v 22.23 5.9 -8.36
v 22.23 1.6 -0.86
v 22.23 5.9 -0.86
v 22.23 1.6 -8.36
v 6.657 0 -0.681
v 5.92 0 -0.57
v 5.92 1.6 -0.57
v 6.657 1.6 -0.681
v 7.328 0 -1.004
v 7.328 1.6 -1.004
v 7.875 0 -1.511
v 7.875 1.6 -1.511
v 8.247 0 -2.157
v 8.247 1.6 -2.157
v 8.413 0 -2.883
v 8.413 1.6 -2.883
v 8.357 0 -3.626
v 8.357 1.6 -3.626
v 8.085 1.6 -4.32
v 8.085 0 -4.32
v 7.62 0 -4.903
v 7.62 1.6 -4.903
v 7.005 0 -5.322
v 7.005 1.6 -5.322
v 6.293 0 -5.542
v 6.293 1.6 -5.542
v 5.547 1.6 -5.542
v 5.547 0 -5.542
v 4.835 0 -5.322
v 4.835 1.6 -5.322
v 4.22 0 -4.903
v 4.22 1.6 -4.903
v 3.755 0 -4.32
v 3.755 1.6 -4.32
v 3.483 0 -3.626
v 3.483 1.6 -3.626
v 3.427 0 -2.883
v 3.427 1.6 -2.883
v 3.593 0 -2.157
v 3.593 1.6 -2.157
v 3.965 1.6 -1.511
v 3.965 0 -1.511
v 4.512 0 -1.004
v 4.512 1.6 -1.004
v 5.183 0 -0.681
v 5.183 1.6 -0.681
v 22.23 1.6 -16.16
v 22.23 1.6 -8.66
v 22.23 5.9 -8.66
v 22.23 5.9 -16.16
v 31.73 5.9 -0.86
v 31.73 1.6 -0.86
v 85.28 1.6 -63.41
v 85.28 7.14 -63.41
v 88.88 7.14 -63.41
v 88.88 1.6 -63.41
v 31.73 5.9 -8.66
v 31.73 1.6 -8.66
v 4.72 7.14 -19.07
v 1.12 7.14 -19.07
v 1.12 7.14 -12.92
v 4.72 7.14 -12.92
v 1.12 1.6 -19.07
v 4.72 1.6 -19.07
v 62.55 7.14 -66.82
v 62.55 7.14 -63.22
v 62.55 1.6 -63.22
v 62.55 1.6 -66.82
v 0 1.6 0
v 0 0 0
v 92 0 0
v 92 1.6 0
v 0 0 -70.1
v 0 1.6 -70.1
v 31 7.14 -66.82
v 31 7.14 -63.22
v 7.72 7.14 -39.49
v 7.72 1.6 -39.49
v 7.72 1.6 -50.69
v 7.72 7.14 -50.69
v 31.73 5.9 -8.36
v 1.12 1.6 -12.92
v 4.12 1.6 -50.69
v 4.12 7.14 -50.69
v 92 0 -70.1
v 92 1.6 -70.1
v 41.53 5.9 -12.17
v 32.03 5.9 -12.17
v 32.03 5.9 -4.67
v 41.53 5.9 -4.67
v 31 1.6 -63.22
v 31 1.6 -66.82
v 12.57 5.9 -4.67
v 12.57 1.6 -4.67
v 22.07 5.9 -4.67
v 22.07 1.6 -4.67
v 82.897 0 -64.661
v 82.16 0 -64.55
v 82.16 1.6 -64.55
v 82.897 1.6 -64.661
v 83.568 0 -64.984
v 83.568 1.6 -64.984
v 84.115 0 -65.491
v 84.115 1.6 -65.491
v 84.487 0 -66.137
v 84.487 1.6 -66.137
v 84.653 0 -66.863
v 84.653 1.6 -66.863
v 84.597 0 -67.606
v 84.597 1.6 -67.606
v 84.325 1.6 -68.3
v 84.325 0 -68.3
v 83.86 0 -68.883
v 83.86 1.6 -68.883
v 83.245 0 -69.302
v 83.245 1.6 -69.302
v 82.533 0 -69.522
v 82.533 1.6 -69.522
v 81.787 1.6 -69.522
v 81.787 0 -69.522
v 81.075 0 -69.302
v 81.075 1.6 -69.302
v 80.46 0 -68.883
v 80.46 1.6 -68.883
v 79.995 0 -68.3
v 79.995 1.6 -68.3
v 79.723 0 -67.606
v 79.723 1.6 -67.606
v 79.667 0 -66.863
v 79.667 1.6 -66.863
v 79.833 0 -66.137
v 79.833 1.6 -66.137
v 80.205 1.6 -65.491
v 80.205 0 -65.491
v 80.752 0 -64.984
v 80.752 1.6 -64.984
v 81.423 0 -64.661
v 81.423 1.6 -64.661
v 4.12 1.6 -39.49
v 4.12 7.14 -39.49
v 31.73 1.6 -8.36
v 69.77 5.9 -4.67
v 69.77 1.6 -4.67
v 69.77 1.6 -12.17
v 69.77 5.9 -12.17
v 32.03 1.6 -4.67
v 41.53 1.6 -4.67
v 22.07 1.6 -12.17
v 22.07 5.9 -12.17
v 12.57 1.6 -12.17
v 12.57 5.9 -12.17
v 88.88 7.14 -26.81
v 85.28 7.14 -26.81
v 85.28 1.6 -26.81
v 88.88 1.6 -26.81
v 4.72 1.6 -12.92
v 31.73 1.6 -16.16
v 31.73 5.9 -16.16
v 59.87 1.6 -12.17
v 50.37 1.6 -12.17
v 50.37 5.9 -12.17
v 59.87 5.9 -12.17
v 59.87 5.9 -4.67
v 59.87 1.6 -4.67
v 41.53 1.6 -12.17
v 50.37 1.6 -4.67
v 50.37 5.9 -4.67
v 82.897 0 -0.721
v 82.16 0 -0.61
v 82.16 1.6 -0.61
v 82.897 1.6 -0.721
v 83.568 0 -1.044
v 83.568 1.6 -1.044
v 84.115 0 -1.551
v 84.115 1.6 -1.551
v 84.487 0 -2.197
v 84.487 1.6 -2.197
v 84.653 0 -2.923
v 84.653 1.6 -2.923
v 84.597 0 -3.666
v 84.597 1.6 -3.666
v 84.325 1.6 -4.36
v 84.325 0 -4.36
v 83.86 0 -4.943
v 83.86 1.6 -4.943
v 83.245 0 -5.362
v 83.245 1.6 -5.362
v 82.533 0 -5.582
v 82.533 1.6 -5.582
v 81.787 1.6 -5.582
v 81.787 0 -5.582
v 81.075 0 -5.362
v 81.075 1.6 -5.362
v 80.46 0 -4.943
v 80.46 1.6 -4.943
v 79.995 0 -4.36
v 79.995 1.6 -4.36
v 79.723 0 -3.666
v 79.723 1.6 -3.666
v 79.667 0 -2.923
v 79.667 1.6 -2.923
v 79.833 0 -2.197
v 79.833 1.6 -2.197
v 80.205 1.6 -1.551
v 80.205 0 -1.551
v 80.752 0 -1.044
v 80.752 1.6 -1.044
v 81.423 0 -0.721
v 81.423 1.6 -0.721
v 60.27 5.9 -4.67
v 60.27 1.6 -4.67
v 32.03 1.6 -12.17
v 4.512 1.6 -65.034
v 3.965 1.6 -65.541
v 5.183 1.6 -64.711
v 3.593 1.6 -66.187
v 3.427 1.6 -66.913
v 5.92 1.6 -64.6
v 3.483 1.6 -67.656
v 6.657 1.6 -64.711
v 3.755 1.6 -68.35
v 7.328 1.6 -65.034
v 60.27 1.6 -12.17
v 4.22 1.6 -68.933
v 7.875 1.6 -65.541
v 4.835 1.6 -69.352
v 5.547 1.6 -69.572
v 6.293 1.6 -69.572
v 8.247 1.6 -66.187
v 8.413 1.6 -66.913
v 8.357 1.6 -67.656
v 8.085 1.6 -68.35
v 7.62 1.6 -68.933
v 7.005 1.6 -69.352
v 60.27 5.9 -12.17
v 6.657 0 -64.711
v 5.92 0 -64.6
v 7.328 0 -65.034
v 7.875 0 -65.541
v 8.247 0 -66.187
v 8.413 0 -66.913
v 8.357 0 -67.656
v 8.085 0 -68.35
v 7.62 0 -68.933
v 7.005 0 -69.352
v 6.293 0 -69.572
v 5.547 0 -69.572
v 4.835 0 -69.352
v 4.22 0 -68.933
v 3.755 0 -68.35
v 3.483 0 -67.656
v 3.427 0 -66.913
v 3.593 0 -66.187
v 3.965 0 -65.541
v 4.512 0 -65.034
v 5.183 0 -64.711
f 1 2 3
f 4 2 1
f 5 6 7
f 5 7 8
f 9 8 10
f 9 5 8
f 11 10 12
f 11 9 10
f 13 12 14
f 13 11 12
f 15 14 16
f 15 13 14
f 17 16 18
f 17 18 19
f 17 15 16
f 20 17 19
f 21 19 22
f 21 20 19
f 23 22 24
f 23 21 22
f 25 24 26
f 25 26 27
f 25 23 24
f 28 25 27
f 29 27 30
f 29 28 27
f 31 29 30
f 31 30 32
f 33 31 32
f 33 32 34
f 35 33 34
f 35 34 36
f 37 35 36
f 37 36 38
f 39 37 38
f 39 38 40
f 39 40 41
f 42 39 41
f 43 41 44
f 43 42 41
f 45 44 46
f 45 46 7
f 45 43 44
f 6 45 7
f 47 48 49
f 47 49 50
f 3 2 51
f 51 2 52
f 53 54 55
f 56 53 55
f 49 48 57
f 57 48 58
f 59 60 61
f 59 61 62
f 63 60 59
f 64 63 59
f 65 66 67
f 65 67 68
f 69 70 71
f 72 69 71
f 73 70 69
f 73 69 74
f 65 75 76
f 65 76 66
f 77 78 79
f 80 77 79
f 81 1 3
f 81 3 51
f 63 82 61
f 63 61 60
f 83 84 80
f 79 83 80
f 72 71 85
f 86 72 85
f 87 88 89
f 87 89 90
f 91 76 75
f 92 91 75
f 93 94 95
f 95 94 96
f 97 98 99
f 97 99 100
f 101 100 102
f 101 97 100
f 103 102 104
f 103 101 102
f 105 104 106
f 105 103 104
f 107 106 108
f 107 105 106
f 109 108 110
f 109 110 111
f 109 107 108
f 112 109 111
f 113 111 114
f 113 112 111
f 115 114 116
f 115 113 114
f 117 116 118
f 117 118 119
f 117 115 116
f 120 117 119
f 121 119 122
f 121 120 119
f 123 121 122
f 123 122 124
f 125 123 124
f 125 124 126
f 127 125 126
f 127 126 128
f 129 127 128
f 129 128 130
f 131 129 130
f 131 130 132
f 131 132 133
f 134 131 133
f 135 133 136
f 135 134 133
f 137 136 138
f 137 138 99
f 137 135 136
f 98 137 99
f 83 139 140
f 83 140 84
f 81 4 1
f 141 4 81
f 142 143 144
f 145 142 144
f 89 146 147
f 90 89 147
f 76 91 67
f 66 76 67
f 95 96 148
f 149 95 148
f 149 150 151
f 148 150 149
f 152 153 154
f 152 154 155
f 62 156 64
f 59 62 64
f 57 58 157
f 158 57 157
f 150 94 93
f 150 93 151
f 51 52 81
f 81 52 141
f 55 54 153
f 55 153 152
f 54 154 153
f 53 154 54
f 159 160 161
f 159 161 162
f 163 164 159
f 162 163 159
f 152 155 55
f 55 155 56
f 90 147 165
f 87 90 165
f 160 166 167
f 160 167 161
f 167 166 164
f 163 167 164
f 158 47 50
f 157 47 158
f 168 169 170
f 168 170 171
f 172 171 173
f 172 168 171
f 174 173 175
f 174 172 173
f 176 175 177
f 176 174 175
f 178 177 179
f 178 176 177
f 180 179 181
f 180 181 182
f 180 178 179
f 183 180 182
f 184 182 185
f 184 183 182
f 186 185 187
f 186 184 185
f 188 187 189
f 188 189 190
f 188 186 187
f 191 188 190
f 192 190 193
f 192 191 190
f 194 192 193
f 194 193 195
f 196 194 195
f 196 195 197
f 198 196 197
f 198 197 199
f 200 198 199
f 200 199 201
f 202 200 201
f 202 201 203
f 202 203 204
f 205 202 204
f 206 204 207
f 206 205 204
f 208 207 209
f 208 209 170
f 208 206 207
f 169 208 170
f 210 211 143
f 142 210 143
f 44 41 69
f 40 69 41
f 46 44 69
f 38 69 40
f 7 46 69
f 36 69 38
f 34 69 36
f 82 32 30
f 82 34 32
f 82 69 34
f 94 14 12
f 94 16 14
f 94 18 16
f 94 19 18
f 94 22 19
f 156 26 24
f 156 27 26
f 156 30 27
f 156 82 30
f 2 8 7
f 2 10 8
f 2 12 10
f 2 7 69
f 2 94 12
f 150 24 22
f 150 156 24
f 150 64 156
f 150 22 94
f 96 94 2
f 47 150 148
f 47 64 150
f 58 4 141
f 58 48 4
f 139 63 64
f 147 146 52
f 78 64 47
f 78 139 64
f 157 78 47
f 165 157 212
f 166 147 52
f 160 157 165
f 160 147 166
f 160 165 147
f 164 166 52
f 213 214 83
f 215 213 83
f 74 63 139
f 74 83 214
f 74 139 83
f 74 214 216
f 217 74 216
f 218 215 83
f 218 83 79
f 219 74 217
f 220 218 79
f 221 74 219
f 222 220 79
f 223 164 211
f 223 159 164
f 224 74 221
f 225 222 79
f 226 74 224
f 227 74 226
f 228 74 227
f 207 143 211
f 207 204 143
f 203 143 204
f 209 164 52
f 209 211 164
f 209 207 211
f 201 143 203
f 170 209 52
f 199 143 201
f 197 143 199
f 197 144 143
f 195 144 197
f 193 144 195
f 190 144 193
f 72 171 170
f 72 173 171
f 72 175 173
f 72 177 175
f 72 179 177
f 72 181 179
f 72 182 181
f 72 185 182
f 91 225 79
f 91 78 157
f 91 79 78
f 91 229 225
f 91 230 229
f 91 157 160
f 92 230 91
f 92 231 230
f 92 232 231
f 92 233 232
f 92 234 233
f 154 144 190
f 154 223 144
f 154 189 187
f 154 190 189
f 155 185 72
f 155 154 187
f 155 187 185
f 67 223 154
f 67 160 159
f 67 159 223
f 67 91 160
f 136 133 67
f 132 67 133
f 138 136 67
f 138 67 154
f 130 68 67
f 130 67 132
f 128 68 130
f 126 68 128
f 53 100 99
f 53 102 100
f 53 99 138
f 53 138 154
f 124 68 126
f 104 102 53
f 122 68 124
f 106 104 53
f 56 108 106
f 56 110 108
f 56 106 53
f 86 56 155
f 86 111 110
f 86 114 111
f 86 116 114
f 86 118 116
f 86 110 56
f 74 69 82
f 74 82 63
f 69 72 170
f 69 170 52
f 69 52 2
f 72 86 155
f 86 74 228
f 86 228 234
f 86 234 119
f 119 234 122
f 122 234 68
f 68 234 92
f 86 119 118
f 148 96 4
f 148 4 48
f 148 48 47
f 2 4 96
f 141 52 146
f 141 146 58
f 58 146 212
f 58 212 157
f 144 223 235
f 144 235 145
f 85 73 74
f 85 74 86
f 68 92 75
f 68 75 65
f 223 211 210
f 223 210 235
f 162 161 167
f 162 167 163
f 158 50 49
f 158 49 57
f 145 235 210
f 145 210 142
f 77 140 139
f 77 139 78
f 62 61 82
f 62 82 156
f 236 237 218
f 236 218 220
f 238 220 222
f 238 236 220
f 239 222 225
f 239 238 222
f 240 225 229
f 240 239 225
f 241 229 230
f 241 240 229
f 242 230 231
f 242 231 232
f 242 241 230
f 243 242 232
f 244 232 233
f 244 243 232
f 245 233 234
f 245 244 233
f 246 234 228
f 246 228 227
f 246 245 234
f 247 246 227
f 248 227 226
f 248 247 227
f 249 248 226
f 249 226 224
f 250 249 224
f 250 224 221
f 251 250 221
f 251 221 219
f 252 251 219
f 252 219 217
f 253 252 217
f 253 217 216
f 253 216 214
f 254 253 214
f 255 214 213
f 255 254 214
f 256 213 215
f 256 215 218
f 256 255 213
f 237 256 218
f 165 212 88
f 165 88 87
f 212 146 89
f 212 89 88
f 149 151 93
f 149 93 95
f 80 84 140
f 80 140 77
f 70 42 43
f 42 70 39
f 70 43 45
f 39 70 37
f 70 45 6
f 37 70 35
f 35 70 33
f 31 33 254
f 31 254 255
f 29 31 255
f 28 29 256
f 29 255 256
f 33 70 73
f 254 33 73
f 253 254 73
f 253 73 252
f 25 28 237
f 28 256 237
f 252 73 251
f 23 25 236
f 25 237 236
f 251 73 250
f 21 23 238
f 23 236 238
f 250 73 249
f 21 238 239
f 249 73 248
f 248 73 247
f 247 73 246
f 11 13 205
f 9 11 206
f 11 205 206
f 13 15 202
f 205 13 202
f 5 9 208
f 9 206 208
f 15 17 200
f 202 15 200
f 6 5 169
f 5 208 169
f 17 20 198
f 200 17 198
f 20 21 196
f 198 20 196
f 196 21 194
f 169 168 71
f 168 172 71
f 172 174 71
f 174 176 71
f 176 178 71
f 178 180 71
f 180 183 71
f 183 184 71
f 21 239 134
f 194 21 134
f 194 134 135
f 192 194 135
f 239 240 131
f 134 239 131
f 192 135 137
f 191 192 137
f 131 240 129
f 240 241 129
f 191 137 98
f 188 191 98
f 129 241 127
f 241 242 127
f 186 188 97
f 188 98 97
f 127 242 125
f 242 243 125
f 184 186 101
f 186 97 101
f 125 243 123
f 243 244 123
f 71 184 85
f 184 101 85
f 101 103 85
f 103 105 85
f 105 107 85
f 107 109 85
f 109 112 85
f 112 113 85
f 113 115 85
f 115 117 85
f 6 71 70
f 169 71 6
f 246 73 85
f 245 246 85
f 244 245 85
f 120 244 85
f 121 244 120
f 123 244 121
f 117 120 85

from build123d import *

# Parameters (mm, degrees)
SKETCH1_W             = 92
SKETCH1_H             = 70.1
SKETCH1_R             = 2.5
Y_PCB_EXTR_DEPTH      = 1.6
SKETCH2_W             = 31.55
SKETCH2_H             = 3.6
SKETCH2_W_2           = 3.6
SKETCH2_H_2           = 11.2
SKETCH2_H_3           = 6.15
SKETCH2_H_4           = 36.6
Y_HEADERS_EXTR_DEPTH  = 5.54
SKETCH3_W             = 9.5
SKETCH3_H             = 7.5
Y_SWITCHES_EXTR_DEPTH = 4.3


with BuildPart() as part:
    # Sketch1 → Y+ PCB extr (new body)
    with BuildSketch(Plane(origin=(0, 0, 0), x_dir=(1, 0, 0), z_dir=(0, 1, 0))):
        with Locations((46, 35.05)):
            Rectangle(SKETCH1_W, SKETCH1_H)
        with Locations(Location((5.92, 3.07, 0), (0, 0, 270))):
            Circle(SKETCH1_R, mode=Mode.SUBTRACT)
        with Locations(Location((82.16, 3.11, 0), (0, 0, 270))):
            Circle(SKETCH1_R, mode=Mode.SUBTRACT)
        with Locations(Location((82.16, 67.05, 0), (0, 0, 270))):
            Circle(SKETCH1_R, mode=Mode.SUBTRACT)
        with Locations(Location((5.92, 67.1, 0), (0, 0, 270))):
            Circle(SKETCH1_R, mode=Mode.SUBTRACT)
    extrude(amount=Y_PCB_EXTR_DEPTH)

    # Sketch2 → Y+ headers extr (add)
    with BuildSketch(Plane(origin=(0, 1.6, 0), x_dir=(1, 0, 0), z_dir=(0, 1, 0))):
        with Locations((46.775, 65.02)):
            Rectangle(SKETCH2_W, SKETCH2_H)
        with Locations((5.92, 45.09)):
            Rectangle(SKETCH2_W_2, SKETCH2_H_2)
        with Locations((2.92, 15.995)):
            Rectangle(SKETCH2_W_2, SKETCH2_H_3)
        with Locations((87.08, 45.11)):
            Rectangle(SKETCH2_W_2, SKETCH2_H_4)
    extrude(amount=Y_HEADERS_EXTR_DEPTH)

    # Sketch3 → Y+ switches extr (add)
    with BuildSketch(Plane(origin=(0, 1.6, 0), x_dir=(1, 0, 0), z_dir=(0, 1, 0))):
        with Locations((17.32, 8.42)):
            Rectangle(SKETCH3_W, SKETCH3_H)
        with Locations((26.98, 4.61)):
            Rectangle(SKETCH3_W, SKETCH3_H)
        with Locations((26.98, 12.41)):
            Rectangle(SKETCH3_W, SKETCH3_H)
        with Locations((36.78, 8.42)):
            Rectangle(SKETCH3_W, SKETCH3_H)
        with Locations((55.12, 8.42)):
            Rectangle(SKETCH3_W, SKETCH3_H)
        with Locations((65.02, 8.42)):
            Rectangle(SKETCH3_W, SKETCH3_H)
    extrude(amount=Y_SWITCHES_EXTR_DEPTH)


solid = part.part
